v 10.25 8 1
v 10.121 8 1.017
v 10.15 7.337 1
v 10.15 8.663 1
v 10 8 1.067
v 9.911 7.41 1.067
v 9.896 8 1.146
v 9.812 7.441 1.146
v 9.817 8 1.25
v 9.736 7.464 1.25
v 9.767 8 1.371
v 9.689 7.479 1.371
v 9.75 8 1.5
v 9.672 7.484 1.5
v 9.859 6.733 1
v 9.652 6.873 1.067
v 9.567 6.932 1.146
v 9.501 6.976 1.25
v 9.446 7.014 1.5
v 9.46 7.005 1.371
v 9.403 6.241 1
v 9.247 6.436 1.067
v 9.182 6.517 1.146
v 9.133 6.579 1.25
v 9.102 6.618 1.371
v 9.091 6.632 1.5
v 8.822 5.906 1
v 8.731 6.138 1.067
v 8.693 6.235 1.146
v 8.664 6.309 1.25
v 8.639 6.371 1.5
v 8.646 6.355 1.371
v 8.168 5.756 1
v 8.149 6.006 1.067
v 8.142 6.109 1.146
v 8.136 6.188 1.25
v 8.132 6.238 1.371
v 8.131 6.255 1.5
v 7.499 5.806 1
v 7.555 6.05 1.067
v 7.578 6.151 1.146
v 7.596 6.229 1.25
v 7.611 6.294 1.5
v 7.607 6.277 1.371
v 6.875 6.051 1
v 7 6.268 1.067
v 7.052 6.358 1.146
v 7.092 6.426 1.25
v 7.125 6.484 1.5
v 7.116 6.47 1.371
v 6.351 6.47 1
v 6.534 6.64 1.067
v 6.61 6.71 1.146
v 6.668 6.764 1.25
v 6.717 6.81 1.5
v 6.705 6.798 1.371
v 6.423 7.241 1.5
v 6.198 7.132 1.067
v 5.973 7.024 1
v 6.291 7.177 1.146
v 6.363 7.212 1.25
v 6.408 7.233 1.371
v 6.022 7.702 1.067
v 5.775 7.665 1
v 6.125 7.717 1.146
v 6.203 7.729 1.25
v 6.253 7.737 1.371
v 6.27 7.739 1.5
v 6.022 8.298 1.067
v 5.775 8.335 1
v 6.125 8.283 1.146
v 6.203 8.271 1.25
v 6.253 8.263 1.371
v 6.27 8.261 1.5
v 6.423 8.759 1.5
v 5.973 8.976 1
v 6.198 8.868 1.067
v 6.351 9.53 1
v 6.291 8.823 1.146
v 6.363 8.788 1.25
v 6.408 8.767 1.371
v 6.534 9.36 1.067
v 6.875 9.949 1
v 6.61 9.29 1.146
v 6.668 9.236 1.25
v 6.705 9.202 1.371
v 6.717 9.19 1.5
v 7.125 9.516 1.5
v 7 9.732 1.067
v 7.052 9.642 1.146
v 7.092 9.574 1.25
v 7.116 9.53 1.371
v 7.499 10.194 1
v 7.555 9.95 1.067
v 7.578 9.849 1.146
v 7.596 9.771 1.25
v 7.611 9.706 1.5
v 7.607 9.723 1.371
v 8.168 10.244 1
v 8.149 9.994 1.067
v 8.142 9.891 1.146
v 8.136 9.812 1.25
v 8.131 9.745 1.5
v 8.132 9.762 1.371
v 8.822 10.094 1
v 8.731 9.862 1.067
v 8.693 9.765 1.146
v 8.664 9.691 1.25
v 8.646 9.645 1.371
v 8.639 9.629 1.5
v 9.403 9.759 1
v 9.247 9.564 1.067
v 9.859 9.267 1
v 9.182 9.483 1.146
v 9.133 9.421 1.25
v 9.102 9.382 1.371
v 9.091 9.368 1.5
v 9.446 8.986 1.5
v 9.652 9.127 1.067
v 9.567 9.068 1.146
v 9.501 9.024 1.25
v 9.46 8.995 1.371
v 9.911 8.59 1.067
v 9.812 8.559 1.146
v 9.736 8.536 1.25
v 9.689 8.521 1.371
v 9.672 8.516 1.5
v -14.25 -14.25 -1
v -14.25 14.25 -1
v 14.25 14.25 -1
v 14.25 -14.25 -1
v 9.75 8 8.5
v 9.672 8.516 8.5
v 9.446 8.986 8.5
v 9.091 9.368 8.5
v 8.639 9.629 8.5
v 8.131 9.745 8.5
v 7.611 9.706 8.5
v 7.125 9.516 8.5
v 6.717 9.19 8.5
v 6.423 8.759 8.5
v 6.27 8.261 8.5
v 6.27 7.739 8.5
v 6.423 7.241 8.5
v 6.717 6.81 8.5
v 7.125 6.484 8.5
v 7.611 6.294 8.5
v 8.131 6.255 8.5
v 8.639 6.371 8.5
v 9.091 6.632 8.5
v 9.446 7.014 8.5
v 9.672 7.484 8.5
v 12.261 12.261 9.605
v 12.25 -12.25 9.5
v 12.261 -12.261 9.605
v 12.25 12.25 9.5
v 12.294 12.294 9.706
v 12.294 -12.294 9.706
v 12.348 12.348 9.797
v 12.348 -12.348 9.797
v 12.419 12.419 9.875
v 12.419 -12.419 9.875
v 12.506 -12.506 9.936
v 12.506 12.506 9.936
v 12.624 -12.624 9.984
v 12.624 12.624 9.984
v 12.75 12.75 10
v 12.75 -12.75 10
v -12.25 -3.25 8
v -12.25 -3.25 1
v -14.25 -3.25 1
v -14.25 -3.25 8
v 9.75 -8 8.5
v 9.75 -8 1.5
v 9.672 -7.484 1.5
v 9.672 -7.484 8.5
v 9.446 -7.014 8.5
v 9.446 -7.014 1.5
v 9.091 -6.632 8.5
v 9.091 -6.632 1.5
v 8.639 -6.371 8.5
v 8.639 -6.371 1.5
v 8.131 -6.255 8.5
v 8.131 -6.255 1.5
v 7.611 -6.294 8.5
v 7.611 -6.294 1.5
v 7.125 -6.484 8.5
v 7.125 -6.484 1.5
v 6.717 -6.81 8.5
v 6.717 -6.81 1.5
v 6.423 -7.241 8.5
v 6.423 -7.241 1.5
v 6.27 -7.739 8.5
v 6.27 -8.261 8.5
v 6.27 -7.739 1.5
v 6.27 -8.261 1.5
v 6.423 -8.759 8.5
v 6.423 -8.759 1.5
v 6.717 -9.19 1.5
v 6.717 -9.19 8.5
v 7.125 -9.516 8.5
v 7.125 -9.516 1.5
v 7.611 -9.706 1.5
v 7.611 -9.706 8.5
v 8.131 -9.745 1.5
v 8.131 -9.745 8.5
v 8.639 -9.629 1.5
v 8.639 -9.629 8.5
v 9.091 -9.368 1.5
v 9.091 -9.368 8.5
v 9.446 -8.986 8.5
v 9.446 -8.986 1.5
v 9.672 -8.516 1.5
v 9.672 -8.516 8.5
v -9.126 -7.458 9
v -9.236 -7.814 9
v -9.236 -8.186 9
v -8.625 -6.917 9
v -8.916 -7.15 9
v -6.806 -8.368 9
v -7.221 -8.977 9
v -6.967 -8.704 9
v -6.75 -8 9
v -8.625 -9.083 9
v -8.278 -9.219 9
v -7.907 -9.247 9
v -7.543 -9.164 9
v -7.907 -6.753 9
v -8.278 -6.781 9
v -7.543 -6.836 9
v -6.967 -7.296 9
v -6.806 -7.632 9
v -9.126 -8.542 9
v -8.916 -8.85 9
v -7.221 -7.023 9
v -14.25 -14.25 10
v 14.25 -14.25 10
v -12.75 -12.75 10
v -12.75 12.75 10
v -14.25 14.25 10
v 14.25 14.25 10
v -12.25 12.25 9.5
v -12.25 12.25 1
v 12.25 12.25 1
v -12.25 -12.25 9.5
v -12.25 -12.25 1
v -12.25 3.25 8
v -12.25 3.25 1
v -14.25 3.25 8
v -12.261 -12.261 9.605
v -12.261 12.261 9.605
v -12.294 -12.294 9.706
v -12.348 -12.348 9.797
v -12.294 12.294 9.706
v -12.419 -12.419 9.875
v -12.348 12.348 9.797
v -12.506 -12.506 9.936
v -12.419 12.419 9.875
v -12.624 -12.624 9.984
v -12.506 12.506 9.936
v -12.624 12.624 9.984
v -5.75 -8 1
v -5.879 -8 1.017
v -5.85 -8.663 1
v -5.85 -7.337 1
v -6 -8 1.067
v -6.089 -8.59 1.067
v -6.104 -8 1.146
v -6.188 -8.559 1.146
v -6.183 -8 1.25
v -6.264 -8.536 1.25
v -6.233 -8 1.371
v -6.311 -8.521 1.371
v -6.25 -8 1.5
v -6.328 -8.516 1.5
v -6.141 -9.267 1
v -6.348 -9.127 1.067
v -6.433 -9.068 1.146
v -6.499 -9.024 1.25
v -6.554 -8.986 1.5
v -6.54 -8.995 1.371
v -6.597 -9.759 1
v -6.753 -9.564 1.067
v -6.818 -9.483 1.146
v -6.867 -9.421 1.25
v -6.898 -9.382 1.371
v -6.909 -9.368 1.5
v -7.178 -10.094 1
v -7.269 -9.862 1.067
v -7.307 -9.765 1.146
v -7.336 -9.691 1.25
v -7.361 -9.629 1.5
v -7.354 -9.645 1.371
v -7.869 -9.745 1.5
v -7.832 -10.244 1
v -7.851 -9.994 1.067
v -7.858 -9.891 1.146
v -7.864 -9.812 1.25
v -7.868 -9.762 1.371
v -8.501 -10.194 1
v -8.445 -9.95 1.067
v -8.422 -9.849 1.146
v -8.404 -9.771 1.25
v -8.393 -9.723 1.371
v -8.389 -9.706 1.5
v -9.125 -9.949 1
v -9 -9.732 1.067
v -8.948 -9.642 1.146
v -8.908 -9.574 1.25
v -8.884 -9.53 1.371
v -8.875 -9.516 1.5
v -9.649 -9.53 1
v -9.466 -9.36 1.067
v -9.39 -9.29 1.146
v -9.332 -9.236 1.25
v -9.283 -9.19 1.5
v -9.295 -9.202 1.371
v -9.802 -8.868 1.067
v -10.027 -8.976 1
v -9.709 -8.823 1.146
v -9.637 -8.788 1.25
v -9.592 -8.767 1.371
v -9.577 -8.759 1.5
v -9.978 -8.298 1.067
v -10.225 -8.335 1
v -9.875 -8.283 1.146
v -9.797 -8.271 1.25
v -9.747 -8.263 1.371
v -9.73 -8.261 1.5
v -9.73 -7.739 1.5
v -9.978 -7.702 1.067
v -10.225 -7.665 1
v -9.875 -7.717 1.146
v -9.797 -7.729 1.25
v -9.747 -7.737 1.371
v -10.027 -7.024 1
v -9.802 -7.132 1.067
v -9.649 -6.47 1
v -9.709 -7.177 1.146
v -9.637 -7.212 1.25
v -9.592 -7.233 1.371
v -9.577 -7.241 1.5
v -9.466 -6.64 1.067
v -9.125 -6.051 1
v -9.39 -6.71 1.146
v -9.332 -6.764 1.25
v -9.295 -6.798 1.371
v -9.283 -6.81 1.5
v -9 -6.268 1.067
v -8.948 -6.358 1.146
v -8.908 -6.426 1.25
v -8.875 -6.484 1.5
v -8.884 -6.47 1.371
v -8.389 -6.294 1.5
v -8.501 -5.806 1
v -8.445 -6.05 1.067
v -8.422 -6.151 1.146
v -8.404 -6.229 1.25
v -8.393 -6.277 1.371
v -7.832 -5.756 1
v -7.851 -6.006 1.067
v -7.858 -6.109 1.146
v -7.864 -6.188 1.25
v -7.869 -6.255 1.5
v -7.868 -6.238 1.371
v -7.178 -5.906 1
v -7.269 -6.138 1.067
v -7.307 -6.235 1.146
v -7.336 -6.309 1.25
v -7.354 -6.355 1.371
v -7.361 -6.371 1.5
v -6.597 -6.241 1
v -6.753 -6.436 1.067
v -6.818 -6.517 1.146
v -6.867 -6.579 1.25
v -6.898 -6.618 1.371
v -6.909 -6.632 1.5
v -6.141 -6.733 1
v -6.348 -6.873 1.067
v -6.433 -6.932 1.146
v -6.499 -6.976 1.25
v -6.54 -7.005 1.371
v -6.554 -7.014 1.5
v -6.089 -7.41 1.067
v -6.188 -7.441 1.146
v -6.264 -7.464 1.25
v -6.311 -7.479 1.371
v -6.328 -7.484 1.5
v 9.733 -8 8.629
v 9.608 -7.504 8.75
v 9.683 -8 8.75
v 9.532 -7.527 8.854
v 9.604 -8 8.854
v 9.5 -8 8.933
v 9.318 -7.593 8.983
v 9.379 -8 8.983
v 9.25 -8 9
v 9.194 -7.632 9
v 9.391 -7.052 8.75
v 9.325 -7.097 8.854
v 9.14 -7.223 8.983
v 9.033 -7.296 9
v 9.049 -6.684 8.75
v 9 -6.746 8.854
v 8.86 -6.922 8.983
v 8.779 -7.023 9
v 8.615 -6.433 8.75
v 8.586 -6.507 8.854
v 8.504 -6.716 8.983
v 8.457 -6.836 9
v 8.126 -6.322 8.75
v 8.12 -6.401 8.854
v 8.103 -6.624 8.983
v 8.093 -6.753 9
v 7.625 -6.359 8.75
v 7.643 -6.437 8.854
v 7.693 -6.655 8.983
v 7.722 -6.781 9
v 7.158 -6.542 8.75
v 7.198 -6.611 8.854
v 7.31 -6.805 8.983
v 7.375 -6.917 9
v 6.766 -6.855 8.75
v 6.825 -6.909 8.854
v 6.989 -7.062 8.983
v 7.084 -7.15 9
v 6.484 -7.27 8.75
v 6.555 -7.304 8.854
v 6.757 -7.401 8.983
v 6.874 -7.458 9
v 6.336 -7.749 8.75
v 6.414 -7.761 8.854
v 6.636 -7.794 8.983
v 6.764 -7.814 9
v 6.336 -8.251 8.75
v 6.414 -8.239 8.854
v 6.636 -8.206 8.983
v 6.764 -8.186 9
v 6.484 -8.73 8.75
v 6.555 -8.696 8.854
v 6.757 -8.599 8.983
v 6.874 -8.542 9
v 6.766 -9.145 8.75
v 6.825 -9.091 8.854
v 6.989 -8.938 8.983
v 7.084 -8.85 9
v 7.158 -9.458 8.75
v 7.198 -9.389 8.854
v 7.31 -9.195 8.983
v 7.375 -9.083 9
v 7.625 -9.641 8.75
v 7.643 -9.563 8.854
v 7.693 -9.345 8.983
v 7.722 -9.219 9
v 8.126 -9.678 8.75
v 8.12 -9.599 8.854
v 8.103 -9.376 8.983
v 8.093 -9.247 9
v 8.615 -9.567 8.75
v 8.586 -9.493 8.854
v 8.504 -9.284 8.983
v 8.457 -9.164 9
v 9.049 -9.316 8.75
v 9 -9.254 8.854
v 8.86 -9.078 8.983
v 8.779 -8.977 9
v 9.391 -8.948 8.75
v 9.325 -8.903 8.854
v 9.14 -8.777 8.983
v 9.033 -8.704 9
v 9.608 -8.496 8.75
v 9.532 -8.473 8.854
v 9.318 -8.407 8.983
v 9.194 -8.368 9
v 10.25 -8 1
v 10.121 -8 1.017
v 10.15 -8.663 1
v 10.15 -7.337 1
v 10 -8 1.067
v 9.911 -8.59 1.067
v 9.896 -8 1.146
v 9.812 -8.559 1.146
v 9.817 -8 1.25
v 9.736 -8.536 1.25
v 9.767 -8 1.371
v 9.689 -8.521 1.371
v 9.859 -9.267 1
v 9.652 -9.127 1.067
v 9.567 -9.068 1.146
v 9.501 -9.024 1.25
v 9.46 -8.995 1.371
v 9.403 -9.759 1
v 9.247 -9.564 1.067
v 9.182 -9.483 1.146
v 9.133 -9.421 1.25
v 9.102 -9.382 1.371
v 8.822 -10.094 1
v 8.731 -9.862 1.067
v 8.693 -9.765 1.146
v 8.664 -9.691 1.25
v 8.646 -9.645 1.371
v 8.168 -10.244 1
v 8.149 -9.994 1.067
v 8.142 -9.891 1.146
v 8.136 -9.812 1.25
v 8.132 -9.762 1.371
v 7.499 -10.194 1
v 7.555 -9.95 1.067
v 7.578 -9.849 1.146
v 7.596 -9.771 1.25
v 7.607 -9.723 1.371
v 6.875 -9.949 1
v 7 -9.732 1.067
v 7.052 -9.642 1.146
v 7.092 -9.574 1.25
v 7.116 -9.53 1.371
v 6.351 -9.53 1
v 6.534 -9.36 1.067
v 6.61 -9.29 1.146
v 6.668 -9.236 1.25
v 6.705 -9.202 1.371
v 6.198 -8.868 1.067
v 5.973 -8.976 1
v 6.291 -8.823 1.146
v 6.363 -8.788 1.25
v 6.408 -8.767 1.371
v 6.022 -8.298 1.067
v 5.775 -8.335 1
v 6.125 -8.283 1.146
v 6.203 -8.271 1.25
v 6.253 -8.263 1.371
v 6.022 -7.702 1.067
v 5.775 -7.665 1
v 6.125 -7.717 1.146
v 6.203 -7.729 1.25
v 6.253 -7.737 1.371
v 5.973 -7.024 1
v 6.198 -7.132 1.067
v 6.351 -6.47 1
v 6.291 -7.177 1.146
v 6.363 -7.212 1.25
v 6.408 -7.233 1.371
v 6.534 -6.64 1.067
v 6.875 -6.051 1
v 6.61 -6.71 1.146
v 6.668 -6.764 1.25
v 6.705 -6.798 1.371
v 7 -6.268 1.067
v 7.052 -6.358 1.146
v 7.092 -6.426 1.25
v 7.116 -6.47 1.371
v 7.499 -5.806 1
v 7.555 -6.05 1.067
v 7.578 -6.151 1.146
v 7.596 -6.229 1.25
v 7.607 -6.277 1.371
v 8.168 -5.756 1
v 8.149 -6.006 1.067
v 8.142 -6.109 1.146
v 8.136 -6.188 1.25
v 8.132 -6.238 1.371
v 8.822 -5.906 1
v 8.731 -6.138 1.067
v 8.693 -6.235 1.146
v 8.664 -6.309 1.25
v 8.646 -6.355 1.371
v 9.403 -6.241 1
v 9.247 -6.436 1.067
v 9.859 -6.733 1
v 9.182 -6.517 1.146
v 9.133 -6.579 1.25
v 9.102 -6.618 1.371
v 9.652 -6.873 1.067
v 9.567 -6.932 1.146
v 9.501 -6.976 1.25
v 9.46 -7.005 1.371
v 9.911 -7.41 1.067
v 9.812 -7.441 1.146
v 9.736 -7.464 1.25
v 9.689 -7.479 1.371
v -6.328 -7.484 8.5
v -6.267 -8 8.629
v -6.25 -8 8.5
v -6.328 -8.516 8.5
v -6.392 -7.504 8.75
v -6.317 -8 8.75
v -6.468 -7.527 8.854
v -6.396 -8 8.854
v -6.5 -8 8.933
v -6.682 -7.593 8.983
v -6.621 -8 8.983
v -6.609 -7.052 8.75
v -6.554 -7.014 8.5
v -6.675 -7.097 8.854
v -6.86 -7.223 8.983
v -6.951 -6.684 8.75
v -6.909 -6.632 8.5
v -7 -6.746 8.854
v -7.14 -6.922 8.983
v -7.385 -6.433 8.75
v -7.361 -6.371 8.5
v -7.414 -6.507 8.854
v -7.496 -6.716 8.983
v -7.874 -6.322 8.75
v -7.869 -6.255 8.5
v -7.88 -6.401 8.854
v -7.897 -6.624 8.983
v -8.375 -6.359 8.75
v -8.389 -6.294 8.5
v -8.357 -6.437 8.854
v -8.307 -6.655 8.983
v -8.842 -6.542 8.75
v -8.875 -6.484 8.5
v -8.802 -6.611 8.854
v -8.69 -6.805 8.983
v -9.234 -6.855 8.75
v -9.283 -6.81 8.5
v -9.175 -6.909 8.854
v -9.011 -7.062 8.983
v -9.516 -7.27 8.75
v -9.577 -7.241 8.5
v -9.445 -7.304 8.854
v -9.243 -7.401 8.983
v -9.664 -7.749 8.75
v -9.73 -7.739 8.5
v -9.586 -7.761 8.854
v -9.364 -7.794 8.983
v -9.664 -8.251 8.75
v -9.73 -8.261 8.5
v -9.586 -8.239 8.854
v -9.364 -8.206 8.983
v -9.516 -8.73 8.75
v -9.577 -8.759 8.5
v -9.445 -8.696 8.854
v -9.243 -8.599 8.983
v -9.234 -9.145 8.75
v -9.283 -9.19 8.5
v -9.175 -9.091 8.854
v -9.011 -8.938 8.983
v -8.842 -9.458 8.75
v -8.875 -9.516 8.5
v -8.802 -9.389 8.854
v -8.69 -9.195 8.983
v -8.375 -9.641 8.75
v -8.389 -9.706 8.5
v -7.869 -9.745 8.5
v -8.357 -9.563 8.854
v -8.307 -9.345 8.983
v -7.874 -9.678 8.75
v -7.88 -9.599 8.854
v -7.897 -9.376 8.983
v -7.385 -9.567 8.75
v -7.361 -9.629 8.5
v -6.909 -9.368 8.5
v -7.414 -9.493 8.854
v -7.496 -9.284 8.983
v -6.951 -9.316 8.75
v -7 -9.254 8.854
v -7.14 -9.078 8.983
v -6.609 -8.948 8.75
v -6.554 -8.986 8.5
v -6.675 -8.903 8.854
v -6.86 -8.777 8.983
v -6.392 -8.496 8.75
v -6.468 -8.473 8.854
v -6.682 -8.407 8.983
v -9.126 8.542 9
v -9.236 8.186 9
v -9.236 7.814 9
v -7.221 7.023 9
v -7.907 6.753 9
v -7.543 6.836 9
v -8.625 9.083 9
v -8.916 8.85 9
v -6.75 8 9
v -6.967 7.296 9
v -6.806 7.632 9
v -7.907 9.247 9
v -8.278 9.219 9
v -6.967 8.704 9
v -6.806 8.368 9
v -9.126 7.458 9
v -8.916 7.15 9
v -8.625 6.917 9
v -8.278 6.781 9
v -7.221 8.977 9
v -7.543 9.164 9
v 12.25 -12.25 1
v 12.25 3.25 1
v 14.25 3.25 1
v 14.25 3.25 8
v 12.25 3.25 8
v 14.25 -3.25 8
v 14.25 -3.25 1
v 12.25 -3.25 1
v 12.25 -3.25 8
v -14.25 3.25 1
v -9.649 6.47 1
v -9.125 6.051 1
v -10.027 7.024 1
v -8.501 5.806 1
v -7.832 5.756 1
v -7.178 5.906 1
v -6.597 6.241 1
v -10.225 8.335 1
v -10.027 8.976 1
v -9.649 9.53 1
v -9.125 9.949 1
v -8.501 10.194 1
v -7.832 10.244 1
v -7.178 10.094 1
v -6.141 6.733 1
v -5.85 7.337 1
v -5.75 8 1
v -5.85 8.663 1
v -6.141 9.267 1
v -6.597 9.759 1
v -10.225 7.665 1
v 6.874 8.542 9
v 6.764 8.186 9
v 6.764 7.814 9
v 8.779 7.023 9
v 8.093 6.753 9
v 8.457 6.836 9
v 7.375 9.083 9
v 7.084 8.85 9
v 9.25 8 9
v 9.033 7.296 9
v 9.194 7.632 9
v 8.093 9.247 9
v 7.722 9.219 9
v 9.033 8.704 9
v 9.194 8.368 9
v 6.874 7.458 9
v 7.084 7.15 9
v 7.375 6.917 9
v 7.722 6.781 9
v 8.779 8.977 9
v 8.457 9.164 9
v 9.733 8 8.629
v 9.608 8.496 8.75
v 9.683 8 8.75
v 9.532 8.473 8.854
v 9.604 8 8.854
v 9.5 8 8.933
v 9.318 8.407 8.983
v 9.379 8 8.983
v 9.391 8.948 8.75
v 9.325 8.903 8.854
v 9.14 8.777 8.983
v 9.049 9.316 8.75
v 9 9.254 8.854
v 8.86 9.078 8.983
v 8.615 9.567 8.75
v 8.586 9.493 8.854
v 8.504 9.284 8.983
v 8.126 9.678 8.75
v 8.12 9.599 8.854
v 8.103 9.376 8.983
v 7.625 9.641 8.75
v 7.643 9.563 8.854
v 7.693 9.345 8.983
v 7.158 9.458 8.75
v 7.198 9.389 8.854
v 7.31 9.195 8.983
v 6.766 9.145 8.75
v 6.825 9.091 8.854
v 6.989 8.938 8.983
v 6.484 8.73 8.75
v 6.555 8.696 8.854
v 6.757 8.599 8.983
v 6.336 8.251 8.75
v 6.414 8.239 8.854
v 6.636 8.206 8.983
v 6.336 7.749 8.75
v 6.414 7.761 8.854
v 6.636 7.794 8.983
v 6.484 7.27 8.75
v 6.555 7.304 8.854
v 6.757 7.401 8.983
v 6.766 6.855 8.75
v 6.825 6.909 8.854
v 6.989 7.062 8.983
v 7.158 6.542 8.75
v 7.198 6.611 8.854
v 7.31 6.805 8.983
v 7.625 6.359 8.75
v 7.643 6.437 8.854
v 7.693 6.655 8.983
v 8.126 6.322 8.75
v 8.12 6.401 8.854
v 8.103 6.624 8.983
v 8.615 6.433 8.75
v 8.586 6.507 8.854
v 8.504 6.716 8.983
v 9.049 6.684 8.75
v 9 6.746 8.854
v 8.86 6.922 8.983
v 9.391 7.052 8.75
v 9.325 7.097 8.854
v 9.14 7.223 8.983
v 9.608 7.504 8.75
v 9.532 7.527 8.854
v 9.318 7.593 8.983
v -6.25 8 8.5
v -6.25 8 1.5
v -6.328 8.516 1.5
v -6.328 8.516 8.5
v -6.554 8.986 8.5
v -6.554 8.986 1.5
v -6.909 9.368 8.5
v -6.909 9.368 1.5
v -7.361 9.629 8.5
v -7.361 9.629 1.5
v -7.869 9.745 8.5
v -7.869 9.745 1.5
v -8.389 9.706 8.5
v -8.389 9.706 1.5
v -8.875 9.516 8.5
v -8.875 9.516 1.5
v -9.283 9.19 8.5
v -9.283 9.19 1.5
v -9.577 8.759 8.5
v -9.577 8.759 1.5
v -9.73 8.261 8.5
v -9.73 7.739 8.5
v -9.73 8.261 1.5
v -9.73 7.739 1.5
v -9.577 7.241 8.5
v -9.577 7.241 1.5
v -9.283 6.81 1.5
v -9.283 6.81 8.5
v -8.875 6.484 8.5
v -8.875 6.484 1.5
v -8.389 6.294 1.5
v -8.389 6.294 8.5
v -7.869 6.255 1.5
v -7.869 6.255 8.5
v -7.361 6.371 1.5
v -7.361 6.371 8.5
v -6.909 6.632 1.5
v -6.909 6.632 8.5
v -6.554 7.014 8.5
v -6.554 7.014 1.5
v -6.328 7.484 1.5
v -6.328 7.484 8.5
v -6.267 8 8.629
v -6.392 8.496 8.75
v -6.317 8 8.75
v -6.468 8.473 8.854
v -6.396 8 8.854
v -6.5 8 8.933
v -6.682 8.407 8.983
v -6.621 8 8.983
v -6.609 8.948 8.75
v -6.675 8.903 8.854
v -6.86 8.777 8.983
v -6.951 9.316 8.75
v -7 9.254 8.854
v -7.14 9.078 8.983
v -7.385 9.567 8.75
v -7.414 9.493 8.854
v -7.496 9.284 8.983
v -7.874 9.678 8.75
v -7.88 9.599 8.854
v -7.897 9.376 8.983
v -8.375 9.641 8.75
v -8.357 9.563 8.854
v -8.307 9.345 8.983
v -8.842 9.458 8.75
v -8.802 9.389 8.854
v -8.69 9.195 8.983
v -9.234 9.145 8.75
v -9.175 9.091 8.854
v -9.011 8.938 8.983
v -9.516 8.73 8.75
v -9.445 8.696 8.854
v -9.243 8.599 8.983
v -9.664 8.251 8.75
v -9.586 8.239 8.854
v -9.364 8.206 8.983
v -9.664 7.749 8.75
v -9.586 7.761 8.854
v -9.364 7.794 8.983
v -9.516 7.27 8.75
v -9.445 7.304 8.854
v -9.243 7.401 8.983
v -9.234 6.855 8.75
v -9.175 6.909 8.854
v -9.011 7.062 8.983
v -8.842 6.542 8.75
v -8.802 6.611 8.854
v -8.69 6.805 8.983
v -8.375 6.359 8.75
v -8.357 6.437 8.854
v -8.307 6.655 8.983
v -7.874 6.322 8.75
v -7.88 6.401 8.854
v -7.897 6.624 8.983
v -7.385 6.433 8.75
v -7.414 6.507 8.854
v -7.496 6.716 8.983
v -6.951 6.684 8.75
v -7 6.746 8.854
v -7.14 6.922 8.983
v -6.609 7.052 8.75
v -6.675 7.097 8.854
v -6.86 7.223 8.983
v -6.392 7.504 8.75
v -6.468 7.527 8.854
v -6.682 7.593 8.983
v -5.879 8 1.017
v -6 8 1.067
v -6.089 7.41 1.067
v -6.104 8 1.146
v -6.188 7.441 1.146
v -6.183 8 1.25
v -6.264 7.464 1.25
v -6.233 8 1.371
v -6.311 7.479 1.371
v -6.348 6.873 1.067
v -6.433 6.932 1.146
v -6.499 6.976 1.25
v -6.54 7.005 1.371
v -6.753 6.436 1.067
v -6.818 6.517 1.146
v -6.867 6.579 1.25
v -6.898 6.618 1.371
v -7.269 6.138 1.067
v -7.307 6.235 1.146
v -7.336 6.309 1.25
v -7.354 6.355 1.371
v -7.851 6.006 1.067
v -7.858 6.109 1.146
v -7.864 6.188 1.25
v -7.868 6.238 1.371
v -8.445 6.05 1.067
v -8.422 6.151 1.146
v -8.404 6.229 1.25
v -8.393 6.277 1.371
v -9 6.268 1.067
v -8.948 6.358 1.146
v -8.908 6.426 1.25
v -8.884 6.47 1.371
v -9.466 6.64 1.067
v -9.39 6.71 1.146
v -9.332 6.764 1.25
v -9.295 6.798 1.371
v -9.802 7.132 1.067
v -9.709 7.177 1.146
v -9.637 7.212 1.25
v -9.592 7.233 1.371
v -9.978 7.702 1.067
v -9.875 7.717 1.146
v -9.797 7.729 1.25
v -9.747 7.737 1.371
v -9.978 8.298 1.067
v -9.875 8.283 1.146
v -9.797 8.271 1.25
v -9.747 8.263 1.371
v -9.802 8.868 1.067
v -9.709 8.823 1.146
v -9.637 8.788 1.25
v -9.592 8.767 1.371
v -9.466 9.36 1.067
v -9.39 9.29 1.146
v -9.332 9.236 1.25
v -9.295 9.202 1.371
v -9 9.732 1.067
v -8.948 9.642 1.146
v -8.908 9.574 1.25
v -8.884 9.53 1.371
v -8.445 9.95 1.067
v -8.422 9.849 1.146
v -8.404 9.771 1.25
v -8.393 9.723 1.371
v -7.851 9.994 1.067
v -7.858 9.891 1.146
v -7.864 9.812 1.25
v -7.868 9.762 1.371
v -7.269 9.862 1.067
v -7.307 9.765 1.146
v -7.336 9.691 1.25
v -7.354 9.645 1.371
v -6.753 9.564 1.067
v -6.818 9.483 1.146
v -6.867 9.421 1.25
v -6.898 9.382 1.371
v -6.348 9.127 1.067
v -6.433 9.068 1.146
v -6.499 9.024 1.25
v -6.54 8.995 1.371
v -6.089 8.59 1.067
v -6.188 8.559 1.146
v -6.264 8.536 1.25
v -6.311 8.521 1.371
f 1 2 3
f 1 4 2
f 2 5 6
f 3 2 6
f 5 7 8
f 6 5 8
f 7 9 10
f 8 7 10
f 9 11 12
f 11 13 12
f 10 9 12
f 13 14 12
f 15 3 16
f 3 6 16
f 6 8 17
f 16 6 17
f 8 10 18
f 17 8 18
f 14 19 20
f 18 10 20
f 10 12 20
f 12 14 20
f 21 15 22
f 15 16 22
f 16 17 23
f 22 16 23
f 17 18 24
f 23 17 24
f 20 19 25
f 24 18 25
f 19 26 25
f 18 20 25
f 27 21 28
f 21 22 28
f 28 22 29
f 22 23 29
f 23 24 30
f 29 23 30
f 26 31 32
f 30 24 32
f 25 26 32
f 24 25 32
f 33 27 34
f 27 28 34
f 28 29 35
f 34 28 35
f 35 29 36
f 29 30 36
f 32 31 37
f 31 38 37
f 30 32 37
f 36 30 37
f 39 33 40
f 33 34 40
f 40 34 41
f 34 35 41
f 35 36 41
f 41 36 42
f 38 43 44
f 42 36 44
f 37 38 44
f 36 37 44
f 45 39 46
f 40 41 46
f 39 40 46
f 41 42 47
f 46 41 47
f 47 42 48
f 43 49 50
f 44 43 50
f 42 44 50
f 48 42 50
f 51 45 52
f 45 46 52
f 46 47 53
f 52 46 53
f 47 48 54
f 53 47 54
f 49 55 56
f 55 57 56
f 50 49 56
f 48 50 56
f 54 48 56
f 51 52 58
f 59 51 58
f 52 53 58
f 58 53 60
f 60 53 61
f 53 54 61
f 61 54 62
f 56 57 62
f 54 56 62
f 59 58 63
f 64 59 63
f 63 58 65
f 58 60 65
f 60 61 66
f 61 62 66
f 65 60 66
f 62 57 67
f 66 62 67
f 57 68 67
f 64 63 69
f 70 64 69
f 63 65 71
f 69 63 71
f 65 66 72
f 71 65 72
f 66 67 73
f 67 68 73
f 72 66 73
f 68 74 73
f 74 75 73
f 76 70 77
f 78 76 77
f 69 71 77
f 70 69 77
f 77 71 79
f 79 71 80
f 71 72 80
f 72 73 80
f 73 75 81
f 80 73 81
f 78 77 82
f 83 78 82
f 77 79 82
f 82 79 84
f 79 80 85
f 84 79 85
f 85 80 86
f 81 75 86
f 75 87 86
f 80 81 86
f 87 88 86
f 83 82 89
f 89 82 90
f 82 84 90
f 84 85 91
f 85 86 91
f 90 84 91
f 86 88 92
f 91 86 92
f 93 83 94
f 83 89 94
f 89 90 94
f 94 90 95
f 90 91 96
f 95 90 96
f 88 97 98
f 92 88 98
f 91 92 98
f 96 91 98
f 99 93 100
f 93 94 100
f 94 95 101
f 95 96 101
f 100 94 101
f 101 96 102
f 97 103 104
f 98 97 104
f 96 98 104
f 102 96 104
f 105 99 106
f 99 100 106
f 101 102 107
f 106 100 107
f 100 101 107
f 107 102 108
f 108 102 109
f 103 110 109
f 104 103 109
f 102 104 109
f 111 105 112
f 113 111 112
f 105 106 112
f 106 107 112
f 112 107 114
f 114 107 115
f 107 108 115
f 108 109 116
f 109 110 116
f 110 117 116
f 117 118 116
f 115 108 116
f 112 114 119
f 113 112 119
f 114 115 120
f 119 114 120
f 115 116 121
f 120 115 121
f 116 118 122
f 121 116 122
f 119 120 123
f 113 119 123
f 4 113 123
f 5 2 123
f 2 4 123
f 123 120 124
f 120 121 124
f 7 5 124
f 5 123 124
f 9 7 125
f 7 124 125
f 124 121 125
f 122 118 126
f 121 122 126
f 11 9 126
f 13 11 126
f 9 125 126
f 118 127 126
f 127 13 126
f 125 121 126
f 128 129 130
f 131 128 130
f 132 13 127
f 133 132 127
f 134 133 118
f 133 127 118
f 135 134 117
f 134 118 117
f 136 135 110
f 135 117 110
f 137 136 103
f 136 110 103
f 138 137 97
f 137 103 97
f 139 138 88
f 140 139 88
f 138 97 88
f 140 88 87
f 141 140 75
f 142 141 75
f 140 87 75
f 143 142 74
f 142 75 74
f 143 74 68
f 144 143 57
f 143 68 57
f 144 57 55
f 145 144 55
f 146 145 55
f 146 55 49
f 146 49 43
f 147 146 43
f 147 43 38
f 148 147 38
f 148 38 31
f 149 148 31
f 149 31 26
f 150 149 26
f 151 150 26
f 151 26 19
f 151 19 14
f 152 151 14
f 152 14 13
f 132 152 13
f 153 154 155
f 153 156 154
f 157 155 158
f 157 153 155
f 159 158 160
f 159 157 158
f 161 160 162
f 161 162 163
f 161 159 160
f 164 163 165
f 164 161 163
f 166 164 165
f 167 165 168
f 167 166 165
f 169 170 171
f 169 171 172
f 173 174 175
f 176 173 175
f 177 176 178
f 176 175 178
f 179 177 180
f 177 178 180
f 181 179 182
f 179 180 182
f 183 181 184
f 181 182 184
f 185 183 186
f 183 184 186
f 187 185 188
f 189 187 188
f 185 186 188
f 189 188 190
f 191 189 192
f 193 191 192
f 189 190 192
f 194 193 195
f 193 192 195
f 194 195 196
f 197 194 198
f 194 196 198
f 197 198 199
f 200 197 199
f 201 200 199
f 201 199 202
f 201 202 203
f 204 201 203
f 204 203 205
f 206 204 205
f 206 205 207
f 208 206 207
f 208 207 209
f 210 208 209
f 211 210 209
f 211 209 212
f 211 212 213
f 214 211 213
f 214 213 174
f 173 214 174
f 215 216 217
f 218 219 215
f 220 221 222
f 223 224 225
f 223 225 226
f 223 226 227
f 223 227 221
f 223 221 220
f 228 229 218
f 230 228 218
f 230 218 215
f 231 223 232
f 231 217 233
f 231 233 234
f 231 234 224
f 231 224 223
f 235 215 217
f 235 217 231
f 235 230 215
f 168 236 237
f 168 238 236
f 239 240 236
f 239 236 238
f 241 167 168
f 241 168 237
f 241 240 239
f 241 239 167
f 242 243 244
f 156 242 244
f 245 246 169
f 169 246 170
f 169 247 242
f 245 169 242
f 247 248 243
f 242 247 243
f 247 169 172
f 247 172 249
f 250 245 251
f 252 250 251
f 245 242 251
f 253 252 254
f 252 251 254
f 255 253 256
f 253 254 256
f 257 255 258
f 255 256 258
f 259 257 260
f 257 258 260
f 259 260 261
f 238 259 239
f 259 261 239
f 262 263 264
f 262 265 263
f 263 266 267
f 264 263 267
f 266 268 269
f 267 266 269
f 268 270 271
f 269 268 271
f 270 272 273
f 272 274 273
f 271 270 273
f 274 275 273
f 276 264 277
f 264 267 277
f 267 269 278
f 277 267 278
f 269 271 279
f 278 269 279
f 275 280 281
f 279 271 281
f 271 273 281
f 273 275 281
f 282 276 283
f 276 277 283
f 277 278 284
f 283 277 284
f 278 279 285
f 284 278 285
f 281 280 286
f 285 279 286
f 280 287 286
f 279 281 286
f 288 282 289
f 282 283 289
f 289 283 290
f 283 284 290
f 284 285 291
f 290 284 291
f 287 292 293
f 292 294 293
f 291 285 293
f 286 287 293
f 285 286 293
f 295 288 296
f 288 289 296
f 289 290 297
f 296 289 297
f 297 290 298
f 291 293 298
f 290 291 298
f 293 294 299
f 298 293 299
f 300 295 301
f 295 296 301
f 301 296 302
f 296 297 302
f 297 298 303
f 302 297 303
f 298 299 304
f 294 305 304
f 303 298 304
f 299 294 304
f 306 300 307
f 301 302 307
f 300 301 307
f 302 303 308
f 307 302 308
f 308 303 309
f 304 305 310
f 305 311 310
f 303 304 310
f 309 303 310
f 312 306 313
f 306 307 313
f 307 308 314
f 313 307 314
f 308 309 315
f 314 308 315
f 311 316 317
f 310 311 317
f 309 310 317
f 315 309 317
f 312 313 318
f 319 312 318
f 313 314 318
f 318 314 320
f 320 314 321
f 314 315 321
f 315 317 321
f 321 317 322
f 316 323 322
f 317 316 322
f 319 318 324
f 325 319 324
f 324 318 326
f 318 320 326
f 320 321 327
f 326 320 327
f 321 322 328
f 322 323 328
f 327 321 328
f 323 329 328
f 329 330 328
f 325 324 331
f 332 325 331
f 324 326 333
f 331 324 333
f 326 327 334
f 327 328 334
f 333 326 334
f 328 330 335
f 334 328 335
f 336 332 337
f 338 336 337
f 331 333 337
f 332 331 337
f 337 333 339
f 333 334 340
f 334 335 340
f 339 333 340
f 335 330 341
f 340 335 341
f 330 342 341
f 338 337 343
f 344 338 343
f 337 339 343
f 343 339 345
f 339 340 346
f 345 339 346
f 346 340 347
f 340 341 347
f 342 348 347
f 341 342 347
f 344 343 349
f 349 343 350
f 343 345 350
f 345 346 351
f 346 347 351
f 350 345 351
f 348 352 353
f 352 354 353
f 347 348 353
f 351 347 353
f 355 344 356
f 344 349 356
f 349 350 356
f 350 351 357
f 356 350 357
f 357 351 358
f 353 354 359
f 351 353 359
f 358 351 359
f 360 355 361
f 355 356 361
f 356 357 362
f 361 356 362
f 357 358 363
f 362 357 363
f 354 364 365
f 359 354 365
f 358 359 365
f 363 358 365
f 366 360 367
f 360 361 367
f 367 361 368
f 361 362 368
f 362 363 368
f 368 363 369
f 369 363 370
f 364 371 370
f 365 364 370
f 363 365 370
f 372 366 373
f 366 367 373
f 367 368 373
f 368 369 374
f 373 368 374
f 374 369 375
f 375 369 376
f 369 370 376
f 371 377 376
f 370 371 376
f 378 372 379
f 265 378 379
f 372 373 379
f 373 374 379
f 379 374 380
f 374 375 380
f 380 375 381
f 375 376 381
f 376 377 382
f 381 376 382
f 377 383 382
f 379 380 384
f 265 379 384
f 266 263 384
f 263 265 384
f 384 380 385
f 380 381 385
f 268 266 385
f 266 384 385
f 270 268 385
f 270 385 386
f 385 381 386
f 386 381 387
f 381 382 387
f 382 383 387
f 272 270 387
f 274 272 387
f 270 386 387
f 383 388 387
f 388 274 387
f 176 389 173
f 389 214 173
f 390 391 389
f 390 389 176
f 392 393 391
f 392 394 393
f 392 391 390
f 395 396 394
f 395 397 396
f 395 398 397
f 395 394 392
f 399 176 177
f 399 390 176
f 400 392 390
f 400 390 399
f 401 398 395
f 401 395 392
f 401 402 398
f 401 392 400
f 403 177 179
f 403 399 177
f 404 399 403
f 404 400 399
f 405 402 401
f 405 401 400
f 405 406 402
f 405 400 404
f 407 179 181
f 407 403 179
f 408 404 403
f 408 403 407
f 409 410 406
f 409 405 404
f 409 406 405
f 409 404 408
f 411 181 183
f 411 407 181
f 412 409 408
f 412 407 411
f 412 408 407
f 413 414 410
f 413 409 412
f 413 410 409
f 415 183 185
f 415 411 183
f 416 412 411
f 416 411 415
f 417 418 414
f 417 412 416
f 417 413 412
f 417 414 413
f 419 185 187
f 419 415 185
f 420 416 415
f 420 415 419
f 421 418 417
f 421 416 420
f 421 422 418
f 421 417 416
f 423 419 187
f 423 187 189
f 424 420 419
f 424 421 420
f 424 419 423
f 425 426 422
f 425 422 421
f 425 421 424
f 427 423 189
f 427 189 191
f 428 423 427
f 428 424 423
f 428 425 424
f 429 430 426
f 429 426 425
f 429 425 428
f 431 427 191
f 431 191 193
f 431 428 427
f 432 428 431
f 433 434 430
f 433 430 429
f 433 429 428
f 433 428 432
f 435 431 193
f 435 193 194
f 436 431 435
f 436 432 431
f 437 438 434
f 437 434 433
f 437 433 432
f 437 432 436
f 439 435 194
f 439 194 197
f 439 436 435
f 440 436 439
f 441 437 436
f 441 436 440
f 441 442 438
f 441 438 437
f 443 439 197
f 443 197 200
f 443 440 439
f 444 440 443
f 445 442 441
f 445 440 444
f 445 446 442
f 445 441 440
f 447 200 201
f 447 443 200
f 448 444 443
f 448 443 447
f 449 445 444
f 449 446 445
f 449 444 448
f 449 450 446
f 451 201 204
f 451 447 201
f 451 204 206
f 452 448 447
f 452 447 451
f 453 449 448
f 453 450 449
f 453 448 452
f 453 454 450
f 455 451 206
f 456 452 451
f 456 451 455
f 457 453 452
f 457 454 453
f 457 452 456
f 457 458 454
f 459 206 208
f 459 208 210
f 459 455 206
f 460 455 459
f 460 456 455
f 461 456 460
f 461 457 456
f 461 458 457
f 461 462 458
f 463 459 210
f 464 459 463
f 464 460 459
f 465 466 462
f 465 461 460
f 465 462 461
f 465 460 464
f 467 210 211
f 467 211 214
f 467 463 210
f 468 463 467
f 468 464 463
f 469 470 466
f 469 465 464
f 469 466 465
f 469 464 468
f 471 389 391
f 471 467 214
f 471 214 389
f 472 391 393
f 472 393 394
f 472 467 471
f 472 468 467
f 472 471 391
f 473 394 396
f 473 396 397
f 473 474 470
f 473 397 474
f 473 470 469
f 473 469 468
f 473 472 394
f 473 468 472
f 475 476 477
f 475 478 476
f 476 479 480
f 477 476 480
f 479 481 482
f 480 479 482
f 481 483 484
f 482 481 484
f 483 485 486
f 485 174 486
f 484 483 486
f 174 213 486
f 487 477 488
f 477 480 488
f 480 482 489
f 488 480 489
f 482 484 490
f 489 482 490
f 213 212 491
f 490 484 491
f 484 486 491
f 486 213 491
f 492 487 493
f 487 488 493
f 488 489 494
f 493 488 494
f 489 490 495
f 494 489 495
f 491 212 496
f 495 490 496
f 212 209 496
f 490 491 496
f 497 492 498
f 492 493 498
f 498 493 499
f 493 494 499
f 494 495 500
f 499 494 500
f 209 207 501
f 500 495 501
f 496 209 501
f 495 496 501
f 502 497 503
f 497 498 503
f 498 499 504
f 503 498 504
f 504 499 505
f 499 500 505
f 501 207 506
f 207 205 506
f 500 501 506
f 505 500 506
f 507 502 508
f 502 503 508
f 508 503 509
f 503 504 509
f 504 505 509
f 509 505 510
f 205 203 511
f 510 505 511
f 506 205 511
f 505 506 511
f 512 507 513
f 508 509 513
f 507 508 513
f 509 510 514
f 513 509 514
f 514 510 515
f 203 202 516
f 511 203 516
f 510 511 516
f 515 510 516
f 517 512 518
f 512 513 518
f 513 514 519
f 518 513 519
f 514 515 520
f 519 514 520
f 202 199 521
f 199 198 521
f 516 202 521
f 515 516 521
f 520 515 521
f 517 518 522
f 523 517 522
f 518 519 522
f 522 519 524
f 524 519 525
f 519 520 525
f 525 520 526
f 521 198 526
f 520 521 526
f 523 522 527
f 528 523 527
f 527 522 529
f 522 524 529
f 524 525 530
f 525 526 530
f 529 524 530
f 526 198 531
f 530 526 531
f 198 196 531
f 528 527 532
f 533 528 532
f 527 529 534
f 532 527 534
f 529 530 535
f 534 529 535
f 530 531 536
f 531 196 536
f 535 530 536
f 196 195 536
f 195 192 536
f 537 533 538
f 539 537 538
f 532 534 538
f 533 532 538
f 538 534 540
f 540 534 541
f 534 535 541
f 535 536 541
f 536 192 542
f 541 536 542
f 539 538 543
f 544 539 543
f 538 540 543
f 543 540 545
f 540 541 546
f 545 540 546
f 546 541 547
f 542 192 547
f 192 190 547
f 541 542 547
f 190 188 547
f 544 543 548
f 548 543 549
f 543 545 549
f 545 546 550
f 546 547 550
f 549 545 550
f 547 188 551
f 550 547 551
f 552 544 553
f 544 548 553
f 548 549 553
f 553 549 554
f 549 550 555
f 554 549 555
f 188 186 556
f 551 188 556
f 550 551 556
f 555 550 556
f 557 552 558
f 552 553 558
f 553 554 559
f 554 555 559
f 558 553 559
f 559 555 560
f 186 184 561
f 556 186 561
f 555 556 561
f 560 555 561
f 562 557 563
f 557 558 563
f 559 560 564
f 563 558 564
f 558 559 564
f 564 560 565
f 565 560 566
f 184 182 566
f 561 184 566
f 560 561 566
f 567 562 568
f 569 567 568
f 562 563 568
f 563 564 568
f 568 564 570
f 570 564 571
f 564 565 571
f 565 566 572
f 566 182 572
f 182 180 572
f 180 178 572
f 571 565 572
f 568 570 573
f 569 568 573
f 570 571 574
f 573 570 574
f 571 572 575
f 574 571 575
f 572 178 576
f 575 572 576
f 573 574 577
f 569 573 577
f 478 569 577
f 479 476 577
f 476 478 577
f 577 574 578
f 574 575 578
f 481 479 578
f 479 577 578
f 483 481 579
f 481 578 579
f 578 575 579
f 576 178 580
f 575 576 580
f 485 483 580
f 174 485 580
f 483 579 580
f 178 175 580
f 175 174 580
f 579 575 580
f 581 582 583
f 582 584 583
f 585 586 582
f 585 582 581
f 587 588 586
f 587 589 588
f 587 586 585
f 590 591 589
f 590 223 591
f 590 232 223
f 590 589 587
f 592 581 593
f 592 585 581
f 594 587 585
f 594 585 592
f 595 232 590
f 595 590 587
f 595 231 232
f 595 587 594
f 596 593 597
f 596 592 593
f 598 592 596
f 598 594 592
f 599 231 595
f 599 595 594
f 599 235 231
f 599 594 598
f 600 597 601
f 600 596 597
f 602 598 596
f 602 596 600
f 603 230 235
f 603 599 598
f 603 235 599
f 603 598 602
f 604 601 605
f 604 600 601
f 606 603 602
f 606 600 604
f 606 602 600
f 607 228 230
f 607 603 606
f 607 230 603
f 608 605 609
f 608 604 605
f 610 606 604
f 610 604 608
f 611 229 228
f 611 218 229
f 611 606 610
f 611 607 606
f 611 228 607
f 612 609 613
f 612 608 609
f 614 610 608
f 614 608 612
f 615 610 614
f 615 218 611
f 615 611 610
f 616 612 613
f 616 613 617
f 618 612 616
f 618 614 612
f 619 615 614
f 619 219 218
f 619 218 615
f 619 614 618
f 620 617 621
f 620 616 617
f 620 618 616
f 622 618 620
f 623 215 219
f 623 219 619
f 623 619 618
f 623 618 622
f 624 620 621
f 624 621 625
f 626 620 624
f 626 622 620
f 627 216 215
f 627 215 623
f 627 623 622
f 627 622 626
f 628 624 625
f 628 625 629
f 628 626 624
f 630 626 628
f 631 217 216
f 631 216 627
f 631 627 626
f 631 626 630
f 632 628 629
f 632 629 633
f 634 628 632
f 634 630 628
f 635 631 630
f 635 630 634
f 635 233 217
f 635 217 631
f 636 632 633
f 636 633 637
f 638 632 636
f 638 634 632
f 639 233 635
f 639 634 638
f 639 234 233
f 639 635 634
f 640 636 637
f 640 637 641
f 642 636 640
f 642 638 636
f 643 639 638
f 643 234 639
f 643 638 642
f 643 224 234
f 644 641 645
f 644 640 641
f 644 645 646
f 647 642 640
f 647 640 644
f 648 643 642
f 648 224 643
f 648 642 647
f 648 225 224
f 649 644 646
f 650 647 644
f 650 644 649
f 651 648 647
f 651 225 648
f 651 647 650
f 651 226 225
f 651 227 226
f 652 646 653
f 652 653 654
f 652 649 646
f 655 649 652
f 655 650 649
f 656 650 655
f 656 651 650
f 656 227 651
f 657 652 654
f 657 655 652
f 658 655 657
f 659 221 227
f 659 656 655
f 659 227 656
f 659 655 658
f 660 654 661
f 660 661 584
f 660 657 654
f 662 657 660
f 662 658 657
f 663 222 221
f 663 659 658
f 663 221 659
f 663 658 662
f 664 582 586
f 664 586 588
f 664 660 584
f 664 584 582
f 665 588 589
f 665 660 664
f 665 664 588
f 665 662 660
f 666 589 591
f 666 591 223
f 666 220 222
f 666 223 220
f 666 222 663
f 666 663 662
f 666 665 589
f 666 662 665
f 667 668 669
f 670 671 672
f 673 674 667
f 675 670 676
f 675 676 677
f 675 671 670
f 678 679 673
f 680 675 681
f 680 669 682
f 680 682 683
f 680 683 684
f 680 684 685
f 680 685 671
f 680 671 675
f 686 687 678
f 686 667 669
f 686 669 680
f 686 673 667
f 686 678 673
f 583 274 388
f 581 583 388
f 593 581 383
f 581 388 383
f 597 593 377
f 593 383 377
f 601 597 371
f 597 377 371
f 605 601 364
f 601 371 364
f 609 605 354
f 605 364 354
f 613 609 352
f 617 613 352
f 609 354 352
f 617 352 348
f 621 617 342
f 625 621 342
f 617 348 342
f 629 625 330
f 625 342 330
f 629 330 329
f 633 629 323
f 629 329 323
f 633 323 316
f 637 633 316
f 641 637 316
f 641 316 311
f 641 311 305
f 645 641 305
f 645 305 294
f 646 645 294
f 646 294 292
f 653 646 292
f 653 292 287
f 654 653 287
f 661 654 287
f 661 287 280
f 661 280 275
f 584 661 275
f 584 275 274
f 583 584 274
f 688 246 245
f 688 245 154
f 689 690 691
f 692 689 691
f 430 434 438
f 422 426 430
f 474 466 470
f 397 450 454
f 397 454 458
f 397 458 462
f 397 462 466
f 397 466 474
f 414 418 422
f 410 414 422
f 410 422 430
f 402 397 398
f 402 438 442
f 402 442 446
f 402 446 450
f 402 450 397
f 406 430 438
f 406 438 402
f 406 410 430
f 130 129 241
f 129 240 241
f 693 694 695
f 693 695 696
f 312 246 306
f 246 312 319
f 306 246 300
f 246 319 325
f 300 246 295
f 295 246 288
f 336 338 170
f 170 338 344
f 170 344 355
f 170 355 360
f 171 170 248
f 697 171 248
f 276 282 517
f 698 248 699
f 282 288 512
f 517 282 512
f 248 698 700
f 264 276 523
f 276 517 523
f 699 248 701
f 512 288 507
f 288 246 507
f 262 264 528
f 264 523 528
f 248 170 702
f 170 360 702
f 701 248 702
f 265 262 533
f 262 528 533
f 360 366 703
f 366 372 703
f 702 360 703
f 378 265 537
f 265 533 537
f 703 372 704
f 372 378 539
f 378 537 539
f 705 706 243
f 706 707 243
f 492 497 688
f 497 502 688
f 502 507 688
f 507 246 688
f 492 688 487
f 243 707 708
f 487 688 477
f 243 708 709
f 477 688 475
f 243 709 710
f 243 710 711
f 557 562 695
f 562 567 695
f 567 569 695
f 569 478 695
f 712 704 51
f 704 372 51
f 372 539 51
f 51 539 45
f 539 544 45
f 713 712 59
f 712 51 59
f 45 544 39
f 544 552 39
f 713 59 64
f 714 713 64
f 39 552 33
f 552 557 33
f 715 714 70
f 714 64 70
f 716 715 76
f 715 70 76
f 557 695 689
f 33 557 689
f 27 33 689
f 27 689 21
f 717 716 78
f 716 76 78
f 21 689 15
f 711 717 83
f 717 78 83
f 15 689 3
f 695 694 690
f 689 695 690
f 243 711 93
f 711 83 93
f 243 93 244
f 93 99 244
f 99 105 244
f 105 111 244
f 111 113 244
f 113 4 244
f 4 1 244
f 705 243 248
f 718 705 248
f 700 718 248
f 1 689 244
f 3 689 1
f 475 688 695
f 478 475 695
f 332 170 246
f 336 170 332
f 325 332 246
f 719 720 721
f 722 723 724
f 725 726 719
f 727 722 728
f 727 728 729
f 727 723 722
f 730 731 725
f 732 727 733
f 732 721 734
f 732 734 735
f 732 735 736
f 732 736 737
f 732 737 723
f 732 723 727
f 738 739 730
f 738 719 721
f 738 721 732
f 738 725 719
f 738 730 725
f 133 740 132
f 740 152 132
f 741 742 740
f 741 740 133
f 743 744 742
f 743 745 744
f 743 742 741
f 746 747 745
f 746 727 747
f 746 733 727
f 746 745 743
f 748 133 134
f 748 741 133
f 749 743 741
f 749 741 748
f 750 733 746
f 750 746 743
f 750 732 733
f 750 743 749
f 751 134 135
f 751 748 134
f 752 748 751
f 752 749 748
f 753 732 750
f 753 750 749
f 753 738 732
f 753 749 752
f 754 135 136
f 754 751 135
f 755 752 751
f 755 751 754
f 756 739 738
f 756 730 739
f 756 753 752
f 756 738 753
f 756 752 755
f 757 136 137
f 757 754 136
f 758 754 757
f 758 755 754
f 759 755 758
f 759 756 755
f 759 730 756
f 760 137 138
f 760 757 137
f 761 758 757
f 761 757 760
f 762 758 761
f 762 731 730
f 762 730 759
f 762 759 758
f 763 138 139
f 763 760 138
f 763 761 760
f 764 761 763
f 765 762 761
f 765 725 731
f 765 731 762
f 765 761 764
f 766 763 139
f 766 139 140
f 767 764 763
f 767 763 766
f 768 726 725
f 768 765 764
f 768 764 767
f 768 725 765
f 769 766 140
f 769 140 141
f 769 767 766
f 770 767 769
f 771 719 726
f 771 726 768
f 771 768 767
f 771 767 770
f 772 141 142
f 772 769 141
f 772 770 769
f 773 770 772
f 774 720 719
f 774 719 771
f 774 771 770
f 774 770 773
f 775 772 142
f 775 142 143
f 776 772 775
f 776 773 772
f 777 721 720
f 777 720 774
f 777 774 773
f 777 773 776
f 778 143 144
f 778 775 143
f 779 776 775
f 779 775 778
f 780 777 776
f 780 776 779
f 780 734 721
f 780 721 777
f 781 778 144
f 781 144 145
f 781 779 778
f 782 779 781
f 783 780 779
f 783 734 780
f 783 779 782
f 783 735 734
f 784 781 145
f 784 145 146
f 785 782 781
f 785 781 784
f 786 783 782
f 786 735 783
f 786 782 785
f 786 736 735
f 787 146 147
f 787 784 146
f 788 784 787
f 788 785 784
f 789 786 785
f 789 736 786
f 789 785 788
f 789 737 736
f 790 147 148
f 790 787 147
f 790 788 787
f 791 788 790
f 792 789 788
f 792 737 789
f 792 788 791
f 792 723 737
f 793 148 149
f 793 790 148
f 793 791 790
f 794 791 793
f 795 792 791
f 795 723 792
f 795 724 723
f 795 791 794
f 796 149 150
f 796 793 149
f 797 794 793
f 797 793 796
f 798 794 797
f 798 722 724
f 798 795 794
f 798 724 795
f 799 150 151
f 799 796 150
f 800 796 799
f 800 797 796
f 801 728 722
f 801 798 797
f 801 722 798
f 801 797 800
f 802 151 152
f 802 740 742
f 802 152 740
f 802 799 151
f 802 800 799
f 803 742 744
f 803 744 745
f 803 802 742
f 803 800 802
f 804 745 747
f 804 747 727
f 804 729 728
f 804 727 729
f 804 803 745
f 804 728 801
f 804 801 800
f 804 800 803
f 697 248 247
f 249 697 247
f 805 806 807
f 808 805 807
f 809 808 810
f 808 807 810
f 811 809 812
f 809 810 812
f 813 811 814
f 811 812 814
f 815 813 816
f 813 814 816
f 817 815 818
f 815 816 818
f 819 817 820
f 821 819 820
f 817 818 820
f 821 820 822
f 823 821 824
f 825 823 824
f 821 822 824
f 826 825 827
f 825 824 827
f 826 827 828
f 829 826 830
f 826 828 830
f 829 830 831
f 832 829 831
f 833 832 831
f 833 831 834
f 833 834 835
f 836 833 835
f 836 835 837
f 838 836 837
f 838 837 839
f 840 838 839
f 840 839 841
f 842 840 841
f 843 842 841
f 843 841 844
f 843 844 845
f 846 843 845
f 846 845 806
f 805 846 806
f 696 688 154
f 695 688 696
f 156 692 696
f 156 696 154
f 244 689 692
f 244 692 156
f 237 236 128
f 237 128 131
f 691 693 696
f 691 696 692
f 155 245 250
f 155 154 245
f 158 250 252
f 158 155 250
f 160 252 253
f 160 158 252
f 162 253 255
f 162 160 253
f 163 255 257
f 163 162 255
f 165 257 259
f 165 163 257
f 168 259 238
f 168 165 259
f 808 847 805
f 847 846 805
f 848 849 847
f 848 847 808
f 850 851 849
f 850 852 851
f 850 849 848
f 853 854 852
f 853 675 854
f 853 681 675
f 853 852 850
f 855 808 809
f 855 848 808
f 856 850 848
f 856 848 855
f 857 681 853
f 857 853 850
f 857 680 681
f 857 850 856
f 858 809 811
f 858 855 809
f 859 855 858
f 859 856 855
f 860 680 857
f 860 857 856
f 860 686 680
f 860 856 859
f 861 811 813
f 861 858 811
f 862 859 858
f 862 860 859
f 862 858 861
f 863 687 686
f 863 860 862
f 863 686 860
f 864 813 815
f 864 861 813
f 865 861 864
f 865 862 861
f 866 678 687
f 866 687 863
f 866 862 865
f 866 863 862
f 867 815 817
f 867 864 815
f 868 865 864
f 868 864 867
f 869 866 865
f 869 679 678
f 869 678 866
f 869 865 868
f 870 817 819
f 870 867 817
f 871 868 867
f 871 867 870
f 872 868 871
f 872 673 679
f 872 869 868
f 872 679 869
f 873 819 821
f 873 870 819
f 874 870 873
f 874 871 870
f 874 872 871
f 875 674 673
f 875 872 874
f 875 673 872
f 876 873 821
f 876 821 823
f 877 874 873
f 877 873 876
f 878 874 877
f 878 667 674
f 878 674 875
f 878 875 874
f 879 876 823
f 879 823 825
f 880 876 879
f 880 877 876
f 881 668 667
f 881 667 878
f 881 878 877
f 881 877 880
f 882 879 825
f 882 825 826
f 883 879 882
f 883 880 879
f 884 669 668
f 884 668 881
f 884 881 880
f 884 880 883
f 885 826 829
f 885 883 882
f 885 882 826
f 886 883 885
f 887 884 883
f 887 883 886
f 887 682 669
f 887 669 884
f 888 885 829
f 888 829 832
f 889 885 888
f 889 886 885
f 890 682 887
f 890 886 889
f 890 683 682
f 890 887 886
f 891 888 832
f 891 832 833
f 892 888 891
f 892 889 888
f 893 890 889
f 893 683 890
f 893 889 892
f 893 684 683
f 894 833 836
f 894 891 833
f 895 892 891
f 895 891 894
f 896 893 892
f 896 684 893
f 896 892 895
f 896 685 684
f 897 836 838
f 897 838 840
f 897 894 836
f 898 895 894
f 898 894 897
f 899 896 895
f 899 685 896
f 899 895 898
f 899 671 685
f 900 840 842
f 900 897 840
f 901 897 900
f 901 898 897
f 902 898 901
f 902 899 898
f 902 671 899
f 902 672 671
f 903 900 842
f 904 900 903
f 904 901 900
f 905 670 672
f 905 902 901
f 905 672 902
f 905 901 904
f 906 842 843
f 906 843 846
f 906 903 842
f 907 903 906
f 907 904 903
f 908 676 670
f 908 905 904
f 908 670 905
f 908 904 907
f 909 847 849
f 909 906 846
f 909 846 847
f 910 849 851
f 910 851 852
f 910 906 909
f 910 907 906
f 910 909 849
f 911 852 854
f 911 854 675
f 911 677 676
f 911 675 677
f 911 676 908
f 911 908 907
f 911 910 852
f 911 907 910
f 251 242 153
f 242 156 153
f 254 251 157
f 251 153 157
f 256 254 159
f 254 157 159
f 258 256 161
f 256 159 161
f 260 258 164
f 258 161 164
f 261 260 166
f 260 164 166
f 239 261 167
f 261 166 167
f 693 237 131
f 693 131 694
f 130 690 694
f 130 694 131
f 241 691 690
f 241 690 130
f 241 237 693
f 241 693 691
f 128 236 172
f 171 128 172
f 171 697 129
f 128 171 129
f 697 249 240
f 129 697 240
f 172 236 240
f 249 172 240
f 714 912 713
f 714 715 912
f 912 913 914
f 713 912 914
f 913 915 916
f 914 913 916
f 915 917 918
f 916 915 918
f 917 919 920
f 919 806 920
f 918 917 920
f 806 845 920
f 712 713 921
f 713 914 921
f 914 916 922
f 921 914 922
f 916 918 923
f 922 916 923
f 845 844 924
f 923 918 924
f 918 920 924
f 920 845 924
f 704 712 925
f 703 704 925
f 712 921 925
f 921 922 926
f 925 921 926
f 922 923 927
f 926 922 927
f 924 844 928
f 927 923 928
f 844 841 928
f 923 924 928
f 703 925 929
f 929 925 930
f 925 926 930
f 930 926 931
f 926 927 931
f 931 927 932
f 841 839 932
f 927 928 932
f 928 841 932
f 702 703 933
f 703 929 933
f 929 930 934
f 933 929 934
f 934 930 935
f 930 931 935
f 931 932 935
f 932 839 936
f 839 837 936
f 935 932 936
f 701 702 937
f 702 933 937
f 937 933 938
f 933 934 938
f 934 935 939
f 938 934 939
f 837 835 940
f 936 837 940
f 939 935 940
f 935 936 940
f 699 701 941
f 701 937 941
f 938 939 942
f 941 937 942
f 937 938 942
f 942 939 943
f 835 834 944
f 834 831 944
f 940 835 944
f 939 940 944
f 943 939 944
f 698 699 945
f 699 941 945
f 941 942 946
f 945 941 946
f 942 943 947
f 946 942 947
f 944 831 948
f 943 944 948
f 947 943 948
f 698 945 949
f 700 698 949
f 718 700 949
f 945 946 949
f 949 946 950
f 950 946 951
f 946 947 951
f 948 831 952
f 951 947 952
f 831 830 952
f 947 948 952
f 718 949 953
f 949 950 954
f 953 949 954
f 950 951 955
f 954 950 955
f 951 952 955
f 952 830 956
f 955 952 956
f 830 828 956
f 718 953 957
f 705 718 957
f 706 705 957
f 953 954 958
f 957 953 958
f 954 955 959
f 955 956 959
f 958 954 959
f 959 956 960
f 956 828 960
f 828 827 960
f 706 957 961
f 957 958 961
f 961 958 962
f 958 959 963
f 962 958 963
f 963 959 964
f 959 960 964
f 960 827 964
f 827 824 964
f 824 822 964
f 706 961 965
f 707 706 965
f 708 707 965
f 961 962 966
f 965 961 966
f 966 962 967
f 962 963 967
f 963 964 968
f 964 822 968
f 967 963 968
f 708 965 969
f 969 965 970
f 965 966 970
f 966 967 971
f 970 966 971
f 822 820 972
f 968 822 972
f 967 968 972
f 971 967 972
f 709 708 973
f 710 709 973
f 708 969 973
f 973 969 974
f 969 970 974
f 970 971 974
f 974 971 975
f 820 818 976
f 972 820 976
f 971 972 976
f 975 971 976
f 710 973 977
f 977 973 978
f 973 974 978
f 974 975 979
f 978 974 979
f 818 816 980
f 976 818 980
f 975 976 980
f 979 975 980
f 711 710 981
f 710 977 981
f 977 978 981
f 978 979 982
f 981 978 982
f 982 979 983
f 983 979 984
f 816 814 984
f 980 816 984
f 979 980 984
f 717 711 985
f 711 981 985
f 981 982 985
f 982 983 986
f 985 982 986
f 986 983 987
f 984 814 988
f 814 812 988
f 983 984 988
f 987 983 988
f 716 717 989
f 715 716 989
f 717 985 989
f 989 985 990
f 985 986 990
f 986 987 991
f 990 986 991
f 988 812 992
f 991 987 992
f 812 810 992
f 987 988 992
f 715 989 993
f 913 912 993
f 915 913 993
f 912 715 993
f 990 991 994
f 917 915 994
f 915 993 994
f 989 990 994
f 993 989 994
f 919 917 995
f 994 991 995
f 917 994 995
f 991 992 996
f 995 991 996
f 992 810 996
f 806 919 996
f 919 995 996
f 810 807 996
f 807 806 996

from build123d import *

# Parameters (mm, degrees)
F0_W     = 24.5
F0_H     = 24.5
F1_DEPTH = 1
F2_W     = 28.5
F2_H     = 28.5
F2_W_2   = 24.5
F2_H_2   = 24.5
F3_DEPTH = 10
F4_W     = 6.5
F4_H     = 7
F5_DEPTH = 14.25
F6_R     = 1.75
F7_DEPTH = 9
F8_DEPTH = 1
F9_DEPTH = 1
F10_R    = 0.5


with BuildPart() as f1:
    # F0 (on Top) → F1 (new body)
    with BuildSketch(Plane.XY):
        Rectangle(F0_W, F0_H)
    extrude(amount=F1_DEPTH)

    # F2 (on Top) → F3 (join)
    with BuildSketch(Plane.XY):
        Rectangle(F2_W, F2_H)
        Rectangle(F2_W_2, F2_H_2, mode=Mode.SUBTRACT)
    extrude(amount=F3_DEPTH)

    # F4 (on Right) → F5 (cut, symmetric)
    with BuildSketch(Plane.YZ):
        with Locations((0, 4.5)):
            Rectangle(F4_W, F4_H)
    extrude(amount=F5_DEPTH, both=True, mode=Mode.SUBTRACT)

    # F6 (on Top) → F7 (join)
    with BuildSketch(Plane.XY):
        with Locations((-8, -8)):
            Circle(F6_R)
        with Locations((8, -8)):
            Circle(F6_R)
        with Locations((-8, 8)):
            Circle(F6_R)
        with Locations((8, 8)):
            Circle(F6_R)
    extrude(amount=F7_DEPTH)

    # F0 (on Top) → F8 (join)
    with BuildSketch(Plane.XY):
        Rectangle(F0_W, F0_H)
    extrude(amount=-F8_DEPTH)

    # F2 (on Top) → F9 (join)
    with BuildSketch(Plane.XY):
        Rectangle(F2_W, F2_H)
        Rectangle(F2_W_2, F2_H_2, mode=Mode.SUBTRACT)
    extrude(amount=-F9_DEPTH)

    # F10
    f10_edges = [f1.edges().sort_by_distance(p)[0] for p in [
        (0, -12.25, 10),
        (12.25, 0, 10),
        (0, 12.25, 10),
        (-12.25, 0, 10),
        (-9.75, -8, 9),
        (-9.75, 8, 9),
        (6.25, 8, 9),
        (6.25, -8, 9),
        (-9.75, 8, 1),
        (-9.75, -8, 1),
        (6.25, -8, 1),
        (6.25, 8, 1),
    ]]
    fillet(f10_edges, radius=F10_R)


solid = f1.part
